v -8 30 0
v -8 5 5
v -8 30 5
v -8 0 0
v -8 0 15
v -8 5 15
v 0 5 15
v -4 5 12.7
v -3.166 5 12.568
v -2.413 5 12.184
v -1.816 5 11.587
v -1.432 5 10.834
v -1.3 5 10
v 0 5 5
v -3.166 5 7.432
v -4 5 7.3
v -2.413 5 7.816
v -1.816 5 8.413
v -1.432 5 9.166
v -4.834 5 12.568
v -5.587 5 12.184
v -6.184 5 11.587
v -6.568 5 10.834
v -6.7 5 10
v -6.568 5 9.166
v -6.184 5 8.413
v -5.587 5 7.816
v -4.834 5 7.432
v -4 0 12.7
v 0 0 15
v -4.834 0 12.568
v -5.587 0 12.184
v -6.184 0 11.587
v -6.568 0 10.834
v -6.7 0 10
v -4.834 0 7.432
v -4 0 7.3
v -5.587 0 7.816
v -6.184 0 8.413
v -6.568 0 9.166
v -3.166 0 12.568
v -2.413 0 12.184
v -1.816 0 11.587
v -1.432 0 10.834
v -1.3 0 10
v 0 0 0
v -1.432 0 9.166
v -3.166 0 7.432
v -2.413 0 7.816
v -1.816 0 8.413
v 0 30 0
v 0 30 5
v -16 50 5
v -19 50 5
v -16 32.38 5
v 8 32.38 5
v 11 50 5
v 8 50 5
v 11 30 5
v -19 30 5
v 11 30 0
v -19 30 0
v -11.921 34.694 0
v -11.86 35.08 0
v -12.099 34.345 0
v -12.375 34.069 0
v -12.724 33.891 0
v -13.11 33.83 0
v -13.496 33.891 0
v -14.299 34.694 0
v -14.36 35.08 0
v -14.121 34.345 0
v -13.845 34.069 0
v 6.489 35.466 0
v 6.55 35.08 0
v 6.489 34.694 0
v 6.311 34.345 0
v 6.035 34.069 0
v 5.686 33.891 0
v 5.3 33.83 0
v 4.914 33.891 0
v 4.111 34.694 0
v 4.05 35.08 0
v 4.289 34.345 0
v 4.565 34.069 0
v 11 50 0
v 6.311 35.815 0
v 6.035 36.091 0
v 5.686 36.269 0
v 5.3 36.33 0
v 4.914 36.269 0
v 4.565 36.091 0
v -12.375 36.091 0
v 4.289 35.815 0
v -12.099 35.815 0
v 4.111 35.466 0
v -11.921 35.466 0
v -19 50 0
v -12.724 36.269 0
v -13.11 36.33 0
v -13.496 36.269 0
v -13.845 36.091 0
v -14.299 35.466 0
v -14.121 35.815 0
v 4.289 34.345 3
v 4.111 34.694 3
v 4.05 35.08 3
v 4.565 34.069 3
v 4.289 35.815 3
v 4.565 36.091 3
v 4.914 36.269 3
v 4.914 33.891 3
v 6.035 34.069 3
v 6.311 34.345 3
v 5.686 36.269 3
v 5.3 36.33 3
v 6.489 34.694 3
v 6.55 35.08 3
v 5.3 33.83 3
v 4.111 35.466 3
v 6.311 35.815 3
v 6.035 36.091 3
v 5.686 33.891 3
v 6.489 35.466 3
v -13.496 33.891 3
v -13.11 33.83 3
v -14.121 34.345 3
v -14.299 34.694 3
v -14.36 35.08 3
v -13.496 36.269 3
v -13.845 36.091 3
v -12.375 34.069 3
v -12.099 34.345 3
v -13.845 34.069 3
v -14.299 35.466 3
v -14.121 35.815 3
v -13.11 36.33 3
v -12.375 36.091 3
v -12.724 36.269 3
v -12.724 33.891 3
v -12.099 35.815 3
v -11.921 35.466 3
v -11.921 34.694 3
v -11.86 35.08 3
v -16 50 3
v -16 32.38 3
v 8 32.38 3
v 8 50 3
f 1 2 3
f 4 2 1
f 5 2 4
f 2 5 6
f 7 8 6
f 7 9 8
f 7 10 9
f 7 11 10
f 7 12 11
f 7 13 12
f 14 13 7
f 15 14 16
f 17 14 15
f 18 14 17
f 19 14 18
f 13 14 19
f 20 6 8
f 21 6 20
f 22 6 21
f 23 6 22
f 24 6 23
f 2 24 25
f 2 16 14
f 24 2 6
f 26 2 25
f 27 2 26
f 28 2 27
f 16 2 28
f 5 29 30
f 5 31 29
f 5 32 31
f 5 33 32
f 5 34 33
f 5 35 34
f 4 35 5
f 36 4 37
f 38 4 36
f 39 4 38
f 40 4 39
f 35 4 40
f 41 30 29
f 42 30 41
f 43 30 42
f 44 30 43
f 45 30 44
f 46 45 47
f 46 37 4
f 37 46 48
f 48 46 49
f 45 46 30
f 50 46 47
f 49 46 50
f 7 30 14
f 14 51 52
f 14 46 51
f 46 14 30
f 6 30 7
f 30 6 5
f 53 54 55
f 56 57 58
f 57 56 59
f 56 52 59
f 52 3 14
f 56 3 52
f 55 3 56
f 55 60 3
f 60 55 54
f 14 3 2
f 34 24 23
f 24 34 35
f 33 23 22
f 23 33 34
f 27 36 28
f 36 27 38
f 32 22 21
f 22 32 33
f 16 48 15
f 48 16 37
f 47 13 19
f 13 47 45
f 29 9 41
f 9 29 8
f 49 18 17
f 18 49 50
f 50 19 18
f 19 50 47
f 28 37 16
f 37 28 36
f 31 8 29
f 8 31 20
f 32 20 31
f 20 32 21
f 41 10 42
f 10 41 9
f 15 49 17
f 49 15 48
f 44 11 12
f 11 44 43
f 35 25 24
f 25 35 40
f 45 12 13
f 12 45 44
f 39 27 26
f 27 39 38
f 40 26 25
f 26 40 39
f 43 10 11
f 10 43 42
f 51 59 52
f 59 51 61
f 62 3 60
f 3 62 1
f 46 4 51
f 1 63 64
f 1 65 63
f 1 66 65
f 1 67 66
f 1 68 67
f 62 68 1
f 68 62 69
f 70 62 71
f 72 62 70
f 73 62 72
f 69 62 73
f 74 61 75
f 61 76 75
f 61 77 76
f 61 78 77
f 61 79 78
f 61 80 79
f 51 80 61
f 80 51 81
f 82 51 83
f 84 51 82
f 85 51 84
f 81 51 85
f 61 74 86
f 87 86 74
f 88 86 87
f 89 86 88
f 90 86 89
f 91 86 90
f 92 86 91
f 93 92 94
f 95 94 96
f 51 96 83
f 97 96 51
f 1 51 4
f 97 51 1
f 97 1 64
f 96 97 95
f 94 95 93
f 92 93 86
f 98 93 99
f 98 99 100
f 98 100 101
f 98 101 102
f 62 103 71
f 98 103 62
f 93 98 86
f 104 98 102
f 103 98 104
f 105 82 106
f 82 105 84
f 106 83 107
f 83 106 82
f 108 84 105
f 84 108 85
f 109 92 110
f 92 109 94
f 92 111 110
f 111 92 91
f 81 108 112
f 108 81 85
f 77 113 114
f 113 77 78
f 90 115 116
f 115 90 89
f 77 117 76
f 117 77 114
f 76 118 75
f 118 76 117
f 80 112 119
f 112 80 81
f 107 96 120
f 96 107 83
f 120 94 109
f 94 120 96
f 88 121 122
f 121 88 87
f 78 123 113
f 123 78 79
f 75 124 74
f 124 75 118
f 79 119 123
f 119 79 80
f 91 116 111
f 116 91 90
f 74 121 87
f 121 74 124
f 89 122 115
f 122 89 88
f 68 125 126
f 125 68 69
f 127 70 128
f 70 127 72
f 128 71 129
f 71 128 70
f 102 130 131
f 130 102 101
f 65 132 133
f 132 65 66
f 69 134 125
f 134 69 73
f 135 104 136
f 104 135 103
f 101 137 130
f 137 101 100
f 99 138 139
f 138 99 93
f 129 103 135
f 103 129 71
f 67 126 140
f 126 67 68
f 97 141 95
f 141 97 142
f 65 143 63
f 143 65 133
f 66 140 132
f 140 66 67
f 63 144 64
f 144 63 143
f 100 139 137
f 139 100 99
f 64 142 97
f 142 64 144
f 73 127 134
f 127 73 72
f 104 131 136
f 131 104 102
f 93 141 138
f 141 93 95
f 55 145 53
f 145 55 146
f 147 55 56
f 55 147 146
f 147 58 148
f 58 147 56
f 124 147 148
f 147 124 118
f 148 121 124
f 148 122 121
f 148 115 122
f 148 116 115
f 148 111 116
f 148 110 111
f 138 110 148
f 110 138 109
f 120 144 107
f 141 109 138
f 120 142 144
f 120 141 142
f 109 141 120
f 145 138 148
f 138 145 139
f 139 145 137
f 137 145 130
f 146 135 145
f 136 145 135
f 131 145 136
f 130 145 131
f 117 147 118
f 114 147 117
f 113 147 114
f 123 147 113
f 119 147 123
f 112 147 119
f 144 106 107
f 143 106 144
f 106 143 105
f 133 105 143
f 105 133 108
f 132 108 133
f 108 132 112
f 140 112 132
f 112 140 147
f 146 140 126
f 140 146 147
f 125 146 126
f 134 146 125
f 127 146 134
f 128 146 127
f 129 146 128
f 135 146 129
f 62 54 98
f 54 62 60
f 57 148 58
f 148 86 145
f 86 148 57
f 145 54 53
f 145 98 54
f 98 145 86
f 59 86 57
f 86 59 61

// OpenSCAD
/* [Global Options] */

//There are two ways to mount this, adjustable and fixed. Adjustable can be used for prototyping how it needs to be, but fixed is the recommended option
type = "fixed"; //[fixed, adjustable]

//The total length of the print, usually the length of the hotend minus a small amount. Default value is good for J-Head MK IV-B with a groovemount on a Ultimate Greg's Wade's extruder ( http://www.thingiverse.com/thing:961630 )
hotend_length = 50;

//The resolution to use when rendering holes
resolution = 20;

//If the output should be rendered how it's supposed to be mounted or how it should be printed
render_type = "printed"; //[printed, mounted]

/* [Attachment] */

//The mounting hole to the extruder block, you shouldn't need to modify this
attachment_mount_hole = 5.4;
//The height of the screw mount to the extruder block
attachment_mount_height = 10;
//The thickness of the attachment point to both the extruder block and the sensor board
attachment_thickness = 5;
//The width of the entire attachment
attachment_width = 8;
//The offset from the edges of the internal slide hole. Unused for fixed
attachment_slide_offset = 10;
//The width of the internal slide hole, unused for fixed
attachment_hole_width = 3.2;

/* [Sensor Mount] */
//The mounting holes for the sensor board. Specification is M2.5 screws. Set to exact value so the screws can grip the plastic
sensor_hole = 2.5;
//The width of the sensor board. Taken from the spec sheet
sensor_width = 24;
//The height of the sensor board. Taken from the spec sheet
sensor_height = 17.62;
//The depth of the sensor board
sensor_depth = 2;
//The width of the entire mount
sensor_mount_width = 30;
//The height of the entire mount
sensor_mount_height = 20;

// The thickness of the sensor board mount. On fixed this is the same as the attachment thickness and thus this variable has no effect
sensor_mount_thickness = 8;

// Using the bottom-left of the sensor board, the x of the left hole. Gotten from the spec sheet
sensor_lefthole = 2.7;
// Using the bottom-left of the sensor board, the x of the right hold. Gotten from the spec sheet
sensor_righthole = 21.11;
//Using the bottom-left of the sensor board, the y of both holes. Gotten using the spec sheet
sensor_hole_y = 14.92;
//The width of the attachment point. Unused in fixed
sensor_mount_attach_width = 10;
//The height of the attachment point. Unused in fixed
sensor_mount_attach_height = 8;

/* [Hidden] */
//I use this section for mainly modifying variables used in customizer to variables I used while designing
preview_tab = "";
render_print = render_type == "printed";

//sensor_hole_locations = [[2.7, 14.92], [21.11, 14.92]];
sensor_hole_locations = [[sensor_lefthole, sensor_hole_y], [sensor_righthole, sensor_hole_y]];
sensor_mount_hole = attachment_hole_width;
sensor_mount_depth = sensor_mount_thickness;

$fn = resolution;

if(type == "adjustable"){
if(render_print){
	//Render it how it should be printed
	translate([5, 0, sensor_mount_depth])
	rotate([-90, 0, 0])
	highlight("Sensor Mount")
	sensor_mount();
	
	translate([-5, 0, 0])
	rotate([90, 0, 180])
	highlight("Attachment")
	attachment();
} else {
	//Render it how it should be mounted
	translate([-sensor_mount_width/2, -sensor_mount_depth, 0])
	highlight("Sensor Mount")
	sensor_mount();

	rotate([0, 180, 0])
	translate([-attachment_width/2, 2, -hotend_length-sensor_mount_attach_height/2-sensor_mount_height+sensor_mount_hole*2])
	highlight("Attachment")
	attachment();
}
} else if(type == "fixed"){
	sensor_mount_depth = attachment_thickness;
	if(render_print){
		v2();
	} else {
		translate([0, 0, hotend_length/2])
		rotate([-90, 0, 0])
		translate([attachment_width/2, -hotend_length/2, -attachment_thickness/2])
		v2();
	}
} else echo("Error, invalid type");

module v2(){
	rotate([90, 0, 180])
	highlight("Attachment")
	union(){
	translate([0, attachment_thickness, 0])
		difference(){
			cube([attachment_width, attachment_mount_height, attachment_thickness]); 
			translate([attachment_width/2, attachment_mount_height/2, attachment_thickness/2])
			cylinder(center=true, d=attachment_mount_hole, h=attachment_thickness*2);
	}
	cube([attachment_width, attachment_thickness, hotend_length-sensor_mount_height]);
}
	translate([(sensor_mount_width-attachment_width)/2, hotend_length, attachment_thickness])
	rotate([90, 180, 0])
	highlight("Sensor Mount")
	difference(){
		cube([sensor_mount_width, attachment_thickness, sensor_mount_height]);
		translate([(sensor_mount_width-sensor_width)/2, 0, 0]){
			translate([0, -sensor_depth, -sensor_height])
			cube([sensor_width, sensor_depth*2, sensor_height*2]);
			rotate([90, 0, 0]){
				translate([sensor_hole_locations[0][0], sensor_hole_locations[0][1], -attachment_thickness/2*3])
				cylinder(d=sensor_hole, h=2*sensor_mount_depth);
				
				translate([sensor_hole_locations[1][0], sensor_hole_locations[1][1], -attachment_thickness/2*3])
				cylinder(d=sensor_hole, h=2*sensor_mount_depth);
			}
		}
	}
}

module attachment(){
	translate([0, attachment_thickness, 0])
	difference(){
		cube([attachment_width, attachment_mount_height, attachment_thickness]); 
		translate([attachment_width/2, attachment_mount_height/2, attachment_thickness/2])
		cylinder(center=true, d=attachment_mount_hole, h=attachment_thickness*2);
	}
	
	difference(){
		cube([attachment_width, attachment_thickness, hotend_length]);
		rotate([90, 0, 0])
		translate([attachment_width/2, hotend_length/2, -attachment_thickness/2])
		hull(){
			length = hotend_length - attachment_slide_offset;
			translate([0, length/-2, 0]){
				translate([0, attachment_thickness, 0])
				cylinder(d=attachment_hole_width, h=attachment_thickness*2, center=true);
				translate([0, length, 0])
				cylinder(d=attachment_hole_width, h=attachment_thickness*2, center=true);
		}
	}
}
	
	
}

module sensor_mount(){
	difference(){
		cube([sensor_mount_width, sensor_mount_depth, sensor_mount_height]);
		translate([(sensor_mount_width-sensor_width)/2, 0, 0]){
			translate([0, -sensor_depth, -sensor_height])
			cube([sensor_width, sensor_depth*2, sensor_height*2]);
			rotate([90, 0, 0]){
				translate([sensor_hole_locations[0][0], sensor_hole_locations[0][1], -sensor_mount_depth/2*3])
				cylinder(d=sensor_hole, h=2*sensor_mount_depth);
				
				translate([sensor_hole_locations[1][0], sensor_hole_locations[1][1], -sensor_mount_depth/2*3])
				cylinder(d=sensor_hole, h=2*sensor_mount_depth);
			}
		}
	}
	
	translate([(sensor_mount_width-sensor_mount_attach_width)/2, 0, sensor_mount_height])
	difference(){
		cube([sensor_mount_attach_width, sensor_mount_depth, sensor_mount_attach_height]);
		rotate([90, 0, 0])
		translate([sensor_mount_attach_width/2, sensor_mount_attach_height/2, -sensor_mount_depth/2])
		cylinder(d=sensor_mount_hole, h=2*sensor_mount_depth, center=true);
	}
}

module highlight(this_tab) {
  if (preview_tab == this_tab) {
    color("red") children(0);
  } else {
    children(0);
  }
}
